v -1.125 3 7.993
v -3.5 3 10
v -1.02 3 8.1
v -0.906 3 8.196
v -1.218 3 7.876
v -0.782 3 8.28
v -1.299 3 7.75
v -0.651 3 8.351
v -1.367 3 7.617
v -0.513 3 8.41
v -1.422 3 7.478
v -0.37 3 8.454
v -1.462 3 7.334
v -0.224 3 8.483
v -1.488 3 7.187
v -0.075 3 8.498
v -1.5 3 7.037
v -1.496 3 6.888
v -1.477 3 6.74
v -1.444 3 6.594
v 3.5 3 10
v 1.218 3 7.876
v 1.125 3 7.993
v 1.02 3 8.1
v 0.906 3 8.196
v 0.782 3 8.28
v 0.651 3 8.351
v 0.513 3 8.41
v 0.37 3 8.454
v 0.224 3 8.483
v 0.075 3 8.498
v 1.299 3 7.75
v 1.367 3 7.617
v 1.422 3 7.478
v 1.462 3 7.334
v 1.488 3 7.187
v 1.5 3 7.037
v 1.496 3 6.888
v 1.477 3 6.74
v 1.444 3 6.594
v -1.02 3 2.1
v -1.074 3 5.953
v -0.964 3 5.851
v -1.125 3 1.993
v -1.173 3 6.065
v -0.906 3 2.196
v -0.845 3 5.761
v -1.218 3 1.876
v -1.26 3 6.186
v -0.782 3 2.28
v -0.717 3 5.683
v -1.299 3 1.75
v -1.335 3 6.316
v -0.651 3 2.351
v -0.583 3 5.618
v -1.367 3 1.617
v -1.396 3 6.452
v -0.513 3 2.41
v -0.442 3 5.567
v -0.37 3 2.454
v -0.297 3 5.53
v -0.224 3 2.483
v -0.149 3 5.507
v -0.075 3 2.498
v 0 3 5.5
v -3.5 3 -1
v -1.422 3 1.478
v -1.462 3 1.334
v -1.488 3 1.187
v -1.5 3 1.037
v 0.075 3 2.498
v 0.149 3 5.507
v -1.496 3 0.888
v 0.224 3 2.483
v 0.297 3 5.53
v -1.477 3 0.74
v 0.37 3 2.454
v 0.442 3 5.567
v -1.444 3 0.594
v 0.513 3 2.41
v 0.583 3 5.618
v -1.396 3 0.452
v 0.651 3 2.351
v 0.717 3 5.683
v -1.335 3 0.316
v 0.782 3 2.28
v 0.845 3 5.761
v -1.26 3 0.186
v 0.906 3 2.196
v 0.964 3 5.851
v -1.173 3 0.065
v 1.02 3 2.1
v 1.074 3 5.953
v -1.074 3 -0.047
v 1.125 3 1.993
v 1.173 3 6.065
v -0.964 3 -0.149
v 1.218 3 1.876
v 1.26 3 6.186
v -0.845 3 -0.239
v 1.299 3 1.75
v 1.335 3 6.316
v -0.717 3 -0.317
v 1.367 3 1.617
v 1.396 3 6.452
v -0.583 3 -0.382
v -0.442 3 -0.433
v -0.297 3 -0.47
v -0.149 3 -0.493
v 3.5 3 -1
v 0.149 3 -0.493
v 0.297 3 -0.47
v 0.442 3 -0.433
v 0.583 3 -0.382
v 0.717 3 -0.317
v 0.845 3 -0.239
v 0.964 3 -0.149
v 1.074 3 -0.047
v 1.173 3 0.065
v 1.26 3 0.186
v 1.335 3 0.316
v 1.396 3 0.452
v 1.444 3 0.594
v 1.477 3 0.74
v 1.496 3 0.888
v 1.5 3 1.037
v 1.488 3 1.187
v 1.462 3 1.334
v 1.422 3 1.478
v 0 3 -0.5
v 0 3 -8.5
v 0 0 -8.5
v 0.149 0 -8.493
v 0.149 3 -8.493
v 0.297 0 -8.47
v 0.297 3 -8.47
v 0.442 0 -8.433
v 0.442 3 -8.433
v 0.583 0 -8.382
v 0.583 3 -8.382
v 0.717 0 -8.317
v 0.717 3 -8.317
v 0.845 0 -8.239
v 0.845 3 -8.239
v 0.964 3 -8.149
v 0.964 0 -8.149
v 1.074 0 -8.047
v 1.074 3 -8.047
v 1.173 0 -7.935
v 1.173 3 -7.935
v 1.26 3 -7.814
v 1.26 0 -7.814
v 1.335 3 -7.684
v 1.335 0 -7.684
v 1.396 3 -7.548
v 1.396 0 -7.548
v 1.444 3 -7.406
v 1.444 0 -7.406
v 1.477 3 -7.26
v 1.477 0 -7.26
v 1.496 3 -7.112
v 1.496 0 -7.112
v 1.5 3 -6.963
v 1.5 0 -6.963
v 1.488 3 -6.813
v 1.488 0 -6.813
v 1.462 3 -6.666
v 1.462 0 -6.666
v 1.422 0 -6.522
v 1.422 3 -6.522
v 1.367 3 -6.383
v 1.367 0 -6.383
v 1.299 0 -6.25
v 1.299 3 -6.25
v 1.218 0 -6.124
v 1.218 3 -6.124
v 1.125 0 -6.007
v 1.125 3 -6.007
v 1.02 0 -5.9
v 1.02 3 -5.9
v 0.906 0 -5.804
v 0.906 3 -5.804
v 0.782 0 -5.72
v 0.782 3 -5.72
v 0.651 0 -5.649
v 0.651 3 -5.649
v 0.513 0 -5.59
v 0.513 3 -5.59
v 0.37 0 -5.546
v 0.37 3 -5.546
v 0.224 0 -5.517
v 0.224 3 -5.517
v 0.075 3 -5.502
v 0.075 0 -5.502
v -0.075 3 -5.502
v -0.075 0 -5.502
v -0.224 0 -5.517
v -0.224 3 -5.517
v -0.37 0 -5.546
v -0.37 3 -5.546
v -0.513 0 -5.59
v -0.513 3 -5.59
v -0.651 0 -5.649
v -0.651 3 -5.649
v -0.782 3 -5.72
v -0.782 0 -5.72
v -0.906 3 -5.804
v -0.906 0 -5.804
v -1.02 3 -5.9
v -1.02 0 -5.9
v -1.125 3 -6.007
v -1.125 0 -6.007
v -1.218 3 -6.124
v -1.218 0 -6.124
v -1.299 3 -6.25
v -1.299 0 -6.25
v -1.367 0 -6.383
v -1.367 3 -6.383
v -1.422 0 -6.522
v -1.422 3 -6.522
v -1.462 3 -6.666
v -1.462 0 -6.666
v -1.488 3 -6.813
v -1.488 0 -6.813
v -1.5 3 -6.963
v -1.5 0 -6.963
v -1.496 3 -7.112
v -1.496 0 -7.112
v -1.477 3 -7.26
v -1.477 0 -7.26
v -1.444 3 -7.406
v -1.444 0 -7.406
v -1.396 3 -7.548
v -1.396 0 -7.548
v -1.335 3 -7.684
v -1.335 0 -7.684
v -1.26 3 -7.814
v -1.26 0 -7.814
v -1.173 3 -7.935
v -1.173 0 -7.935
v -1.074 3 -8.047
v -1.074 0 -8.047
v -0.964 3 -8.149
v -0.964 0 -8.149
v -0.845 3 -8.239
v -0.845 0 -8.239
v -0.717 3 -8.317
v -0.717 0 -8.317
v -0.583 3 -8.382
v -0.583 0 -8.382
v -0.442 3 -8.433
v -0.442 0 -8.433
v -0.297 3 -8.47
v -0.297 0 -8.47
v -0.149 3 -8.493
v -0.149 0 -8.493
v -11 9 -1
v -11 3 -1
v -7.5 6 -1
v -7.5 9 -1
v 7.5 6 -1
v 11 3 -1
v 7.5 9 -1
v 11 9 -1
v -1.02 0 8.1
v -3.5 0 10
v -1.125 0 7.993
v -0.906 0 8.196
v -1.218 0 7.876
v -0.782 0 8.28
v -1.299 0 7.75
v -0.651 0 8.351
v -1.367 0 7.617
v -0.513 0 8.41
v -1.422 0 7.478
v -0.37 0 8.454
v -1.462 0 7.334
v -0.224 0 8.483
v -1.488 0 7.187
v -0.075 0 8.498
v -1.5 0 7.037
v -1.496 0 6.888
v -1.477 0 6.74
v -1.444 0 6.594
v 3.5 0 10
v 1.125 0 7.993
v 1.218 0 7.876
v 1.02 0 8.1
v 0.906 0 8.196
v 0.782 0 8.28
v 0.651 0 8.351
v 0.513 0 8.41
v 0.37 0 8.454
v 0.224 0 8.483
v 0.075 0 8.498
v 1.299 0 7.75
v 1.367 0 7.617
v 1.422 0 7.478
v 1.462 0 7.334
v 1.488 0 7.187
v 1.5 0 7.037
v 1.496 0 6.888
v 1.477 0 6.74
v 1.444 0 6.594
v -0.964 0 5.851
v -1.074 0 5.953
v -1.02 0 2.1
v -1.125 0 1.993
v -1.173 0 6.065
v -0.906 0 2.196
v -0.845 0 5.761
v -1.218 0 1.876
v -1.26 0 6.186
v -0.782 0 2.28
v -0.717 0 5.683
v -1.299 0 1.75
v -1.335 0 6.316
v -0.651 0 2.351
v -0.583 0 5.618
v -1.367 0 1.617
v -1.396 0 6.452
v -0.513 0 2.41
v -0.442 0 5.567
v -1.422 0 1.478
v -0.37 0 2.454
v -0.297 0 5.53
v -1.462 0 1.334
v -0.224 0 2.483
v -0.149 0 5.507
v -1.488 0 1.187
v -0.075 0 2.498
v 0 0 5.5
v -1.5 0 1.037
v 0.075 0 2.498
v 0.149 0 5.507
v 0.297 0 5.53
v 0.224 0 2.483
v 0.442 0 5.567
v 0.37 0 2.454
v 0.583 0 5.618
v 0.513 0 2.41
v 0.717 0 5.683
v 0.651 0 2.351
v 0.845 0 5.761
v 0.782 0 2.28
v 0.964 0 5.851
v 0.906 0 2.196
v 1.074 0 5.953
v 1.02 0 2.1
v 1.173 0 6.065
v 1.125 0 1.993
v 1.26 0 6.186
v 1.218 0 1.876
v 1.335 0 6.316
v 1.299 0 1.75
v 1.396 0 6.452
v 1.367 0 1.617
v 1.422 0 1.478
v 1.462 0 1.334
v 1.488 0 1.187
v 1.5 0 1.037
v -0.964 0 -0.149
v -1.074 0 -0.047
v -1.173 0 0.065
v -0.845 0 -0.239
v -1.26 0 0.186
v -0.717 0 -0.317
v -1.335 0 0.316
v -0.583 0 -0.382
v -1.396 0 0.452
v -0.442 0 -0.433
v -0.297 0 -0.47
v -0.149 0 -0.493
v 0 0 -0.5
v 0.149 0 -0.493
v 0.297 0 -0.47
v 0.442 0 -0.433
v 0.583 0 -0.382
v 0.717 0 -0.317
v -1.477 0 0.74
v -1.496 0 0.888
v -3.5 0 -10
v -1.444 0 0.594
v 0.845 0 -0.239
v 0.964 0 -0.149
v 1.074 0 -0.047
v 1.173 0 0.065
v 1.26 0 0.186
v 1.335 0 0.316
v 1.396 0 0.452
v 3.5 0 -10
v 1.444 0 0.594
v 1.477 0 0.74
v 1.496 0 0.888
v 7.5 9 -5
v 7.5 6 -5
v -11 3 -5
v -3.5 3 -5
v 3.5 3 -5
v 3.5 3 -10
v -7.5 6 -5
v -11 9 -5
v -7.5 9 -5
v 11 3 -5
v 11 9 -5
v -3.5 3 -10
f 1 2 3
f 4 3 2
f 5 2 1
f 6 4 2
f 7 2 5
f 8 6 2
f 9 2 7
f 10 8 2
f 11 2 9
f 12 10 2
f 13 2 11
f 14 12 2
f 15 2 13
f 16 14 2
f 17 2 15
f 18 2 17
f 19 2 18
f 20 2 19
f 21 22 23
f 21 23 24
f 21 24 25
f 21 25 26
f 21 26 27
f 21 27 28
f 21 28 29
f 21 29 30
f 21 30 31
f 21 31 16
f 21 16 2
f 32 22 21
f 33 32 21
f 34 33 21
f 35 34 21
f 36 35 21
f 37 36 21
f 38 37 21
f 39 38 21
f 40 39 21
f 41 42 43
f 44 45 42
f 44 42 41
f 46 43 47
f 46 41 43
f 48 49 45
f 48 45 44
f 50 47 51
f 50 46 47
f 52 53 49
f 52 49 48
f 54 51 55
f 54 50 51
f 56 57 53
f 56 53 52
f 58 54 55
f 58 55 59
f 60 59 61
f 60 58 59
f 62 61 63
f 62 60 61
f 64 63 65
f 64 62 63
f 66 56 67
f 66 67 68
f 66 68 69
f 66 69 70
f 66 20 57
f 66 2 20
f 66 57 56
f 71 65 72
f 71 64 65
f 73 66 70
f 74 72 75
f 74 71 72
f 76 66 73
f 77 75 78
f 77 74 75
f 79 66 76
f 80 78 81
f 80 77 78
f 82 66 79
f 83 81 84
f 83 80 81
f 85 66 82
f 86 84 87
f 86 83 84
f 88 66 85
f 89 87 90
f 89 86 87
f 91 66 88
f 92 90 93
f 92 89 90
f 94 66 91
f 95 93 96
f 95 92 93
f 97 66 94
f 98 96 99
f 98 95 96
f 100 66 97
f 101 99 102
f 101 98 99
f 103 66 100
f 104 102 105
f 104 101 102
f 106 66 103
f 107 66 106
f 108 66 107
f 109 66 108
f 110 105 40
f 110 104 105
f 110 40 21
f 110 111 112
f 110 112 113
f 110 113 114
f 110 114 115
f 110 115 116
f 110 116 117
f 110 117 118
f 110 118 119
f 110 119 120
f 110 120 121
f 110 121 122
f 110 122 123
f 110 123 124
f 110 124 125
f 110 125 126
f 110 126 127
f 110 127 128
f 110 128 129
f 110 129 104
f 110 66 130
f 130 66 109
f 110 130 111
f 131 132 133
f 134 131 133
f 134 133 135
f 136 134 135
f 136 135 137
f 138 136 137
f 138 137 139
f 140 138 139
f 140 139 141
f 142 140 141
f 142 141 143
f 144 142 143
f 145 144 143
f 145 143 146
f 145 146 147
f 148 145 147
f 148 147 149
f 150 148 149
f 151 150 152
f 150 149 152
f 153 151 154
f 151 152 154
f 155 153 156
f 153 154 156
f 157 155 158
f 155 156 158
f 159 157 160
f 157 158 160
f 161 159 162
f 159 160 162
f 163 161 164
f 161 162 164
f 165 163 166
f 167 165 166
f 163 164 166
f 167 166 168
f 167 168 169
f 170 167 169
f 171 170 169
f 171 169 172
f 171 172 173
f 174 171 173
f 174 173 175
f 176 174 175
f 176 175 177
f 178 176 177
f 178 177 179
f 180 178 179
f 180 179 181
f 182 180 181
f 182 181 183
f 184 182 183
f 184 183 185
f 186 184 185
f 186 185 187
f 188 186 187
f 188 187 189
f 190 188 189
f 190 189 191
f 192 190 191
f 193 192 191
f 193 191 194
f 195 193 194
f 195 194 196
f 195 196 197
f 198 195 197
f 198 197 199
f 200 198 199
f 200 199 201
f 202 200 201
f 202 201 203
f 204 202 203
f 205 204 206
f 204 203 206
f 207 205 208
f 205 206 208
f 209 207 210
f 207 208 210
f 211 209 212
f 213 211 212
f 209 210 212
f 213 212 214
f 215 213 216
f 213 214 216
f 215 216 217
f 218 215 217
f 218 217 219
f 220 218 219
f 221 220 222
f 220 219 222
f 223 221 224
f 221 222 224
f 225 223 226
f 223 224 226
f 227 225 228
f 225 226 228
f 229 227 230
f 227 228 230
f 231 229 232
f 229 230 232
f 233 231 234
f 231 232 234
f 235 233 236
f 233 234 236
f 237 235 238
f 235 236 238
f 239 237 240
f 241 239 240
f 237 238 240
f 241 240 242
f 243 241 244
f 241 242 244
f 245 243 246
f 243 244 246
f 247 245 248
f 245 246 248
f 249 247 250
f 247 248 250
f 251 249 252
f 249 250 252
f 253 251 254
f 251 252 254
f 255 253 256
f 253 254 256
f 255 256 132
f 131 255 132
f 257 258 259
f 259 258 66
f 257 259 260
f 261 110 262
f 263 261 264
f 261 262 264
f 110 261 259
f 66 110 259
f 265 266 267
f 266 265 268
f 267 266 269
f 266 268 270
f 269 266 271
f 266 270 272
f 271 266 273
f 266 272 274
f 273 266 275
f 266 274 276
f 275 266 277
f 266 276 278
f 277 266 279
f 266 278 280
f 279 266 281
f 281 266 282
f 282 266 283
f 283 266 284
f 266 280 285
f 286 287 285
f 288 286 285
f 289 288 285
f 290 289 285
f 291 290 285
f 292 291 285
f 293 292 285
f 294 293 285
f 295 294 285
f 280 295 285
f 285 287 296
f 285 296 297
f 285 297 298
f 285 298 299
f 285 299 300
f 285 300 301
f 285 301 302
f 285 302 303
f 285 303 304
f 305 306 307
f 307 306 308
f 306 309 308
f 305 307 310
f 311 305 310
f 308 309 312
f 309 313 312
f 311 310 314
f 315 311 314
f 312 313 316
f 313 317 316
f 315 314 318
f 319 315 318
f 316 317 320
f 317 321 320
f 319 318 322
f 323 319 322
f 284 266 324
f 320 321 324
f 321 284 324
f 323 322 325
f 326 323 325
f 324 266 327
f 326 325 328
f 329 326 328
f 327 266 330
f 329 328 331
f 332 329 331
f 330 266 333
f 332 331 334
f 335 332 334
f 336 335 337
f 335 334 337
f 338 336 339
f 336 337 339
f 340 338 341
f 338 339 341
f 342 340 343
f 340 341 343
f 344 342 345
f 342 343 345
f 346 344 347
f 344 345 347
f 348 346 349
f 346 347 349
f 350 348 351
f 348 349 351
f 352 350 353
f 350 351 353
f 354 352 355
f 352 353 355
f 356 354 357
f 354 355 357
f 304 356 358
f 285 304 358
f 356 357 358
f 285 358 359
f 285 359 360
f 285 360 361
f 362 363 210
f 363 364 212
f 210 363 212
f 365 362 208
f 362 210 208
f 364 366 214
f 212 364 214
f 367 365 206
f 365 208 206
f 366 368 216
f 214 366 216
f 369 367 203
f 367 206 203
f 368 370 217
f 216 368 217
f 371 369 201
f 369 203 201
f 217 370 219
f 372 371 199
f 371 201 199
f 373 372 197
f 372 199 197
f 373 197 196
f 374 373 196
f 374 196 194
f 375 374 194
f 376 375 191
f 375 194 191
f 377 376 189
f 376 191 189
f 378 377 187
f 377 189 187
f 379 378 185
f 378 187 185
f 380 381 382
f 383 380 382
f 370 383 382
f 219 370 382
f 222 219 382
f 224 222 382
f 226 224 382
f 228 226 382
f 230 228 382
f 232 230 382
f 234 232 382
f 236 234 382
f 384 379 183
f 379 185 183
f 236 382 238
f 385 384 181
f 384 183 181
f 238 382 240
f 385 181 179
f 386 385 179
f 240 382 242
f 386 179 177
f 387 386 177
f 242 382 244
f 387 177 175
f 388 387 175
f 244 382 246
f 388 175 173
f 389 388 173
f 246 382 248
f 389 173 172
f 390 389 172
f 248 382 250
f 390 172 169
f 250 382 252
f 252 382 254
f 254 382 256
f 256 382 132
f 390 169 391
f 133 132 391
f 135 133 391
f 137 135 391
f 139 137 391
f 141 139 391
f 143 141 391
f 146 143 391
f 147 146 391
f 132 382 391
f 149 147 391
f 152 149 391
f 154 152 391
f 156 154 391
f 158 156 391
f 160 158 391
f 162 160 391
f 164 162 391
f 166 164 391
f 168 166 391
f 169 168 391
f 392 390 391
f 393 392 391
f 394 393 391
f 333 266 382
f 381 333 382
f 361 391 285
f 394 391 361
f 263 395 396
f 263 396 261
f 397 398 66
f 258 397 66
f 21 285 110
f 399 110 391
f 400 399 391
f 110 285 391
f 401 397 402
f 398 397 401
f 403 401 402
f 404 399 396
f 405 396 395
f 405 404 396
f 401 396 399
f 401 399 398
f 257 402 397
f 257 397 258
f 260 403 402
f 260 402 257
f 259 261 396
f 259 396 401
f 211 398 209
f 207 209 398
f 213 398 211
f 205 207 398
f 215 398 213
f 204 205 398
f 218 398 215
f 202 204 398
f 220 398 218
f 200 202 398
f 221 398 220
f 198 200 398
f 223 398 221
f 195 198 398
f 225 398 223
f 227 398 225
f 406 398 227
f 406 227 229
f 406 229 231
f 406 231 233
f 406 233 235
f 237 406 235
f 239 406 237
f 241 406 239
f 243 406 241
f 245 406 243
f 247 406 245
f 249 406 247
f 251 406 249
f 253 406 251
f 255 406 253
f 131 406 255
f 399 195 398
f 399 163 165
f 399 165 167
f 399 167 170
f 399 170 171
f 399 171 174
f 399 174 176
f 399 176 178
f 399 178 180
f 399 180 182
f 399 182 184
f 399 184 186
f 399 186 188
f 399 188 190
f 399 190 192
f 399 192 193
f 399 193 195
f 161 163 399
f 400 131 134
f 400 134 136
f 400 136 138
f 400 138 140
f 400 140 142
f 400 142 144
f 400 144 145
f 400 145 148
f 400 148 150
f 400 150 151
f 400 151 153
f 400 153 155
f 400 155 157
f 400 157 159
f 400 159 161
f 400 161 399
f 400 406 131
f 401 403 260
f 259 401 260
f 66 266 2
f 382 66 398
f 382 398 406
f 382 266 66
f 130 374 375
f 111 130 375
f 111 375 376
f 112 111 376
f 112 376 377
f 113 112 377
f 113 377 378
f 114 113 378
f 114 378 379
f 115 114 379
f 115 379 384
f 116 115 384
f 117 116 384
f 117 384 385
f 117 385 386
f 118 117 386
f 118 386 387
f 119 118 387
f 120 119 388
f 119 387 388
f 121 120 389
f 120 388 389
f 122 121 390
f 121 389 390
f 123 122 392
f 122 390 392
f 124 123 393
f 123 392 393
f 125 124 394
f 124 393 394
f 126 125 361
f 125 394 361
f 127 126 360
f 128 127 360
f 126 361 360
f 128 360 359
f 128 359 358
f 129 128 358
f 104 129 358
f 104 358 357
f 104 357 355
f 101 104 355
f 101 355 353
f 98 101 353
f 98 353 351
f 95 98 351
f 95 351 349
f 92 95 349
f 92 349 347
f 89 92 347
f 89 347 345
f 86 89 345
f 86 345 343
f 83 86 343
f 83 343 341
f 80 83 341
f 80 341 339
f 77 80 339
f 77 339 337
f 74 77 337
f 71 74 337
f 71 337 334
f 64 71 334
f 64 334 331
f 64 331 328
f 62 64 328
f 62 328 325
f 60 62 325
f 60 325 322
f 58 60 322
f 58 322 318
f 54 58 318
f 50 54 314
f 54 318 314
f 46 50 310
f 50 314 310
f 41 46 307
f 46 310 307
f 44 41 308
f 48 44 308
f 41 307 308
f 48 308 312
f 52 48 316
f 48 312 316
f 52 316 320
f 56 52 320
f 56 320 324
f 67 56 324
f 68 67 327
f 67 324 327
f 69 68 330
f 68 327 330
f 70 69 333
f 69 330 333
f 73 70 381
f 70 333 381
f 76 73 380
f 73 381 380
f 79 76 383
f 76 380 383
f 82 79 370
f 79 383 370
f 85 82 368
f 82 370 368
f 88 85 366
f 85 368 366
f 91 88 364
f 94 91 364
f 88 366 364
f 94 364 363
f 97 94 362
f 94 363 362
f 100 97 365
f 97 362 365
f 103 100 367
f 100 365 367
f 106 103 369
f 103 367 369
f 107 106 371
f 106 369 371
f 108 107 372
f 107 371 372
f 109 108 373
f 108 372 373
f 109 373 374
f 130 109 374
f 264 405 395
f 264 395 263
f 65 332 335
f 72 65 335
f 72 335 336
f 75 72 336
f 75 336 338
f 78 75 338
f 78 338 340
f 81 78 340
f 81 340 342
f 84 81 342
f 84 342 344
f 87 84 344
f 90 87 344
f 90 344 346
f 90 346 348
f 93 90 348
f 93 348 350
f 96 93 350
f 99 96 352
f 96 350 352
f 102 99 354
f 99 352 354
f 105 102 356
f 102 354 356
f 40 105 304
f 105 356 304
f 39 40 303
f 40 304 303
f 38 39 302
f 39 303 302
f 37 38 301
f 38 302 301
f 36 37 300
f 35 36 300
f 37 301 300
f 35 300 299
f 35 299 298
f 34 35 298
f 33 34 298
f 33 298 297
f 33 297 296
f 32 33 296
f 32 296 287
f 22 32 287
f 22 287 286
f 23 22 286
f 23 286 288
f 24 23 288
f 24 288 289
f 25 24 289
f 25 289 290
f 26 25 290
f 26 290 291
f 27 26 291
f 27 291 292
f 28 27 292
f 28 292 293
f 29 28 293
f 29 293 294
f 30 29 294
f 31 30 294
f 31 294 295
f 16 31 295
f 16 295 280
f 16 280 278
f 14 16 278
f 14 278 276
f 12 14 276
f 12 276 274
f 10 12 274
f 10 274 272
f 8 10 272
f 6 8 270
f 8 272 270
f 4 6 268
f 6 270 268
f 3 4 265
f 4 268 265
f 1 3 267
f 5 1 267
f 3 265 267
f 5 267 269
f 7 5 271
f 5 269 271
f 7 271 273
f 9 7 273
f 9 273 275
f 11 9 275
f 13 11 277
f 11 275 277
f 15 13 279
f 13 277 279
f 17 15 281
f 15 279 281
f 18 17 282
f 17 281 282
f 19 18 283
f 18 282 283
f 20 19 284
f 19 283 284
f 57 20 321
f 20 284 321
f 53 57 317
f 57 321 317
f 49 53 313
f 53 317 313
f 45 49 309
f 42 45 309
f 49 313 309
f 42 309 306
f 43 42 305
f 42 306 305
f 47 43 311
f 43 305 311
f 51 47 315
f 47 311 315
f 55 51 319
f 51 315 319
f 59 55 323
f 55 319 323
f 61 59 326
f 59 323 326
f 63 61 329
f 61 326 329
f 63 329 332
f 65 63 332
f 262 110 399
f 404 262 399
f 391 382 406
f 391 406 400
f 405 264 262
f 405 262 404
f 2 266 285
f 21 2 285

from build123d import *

# Parameters (mm, degrees)
SKETCH2_W                    = 7
SKETCH2_H                    = 20
EXTRUDE2_DEPTH               = 3
F_3_0_3_DIAMETER_HOLE1_D     = 3
F_3_0_3_DIAMETER_HOLE1_DEPTH = 10
F_3_0_3_DIAMETER_HOLE1_TIP   = 0.901290929
SKETCH6_W                    = 7
SKETCH6_H                    = 4
EXTRUDE3_DEPTH               = 6
SKETCH7_W                    = 4
SKETCH7_H                    = 6
EXTRUDE4_DEPTH               = 7.5
SKETCH8_W                    = 4
SKETCH8_H                    = 6
EXTRUDE5_DEPTH               = 7.5
SKETCH10_W                   = 15
SKETCH10_H                   = 4
EXTRUDE6_DEPTH               = 3


with BuildPart() as part:
    # Sketch2 → Extrude2 (new body)
    with BuildSketch(Plane(origin=(0, 0, 0), x_dir=(1, 0, 0), z_dir=(0, 1, 0))):
        Rectangle(SKETCH2_W, SKETCH2_H)
    extrude(amount=EXTRUDE2_DEPTH)

    # Ø3.0 (3) Diameter Hole1
    with Locations(Plane(origin=(0, 3, 7), x_dir=(0, 0, 1), z_dir=(0, 1, 0))):
        with Locations((0, 0), (-6, 0), (-14, 0)):
            Hole(F_3_0_3_DIAMETER_HOLE1_D / 2, depth=F_3_0_3_DIAMETER_HOLE1_DEPTH)
            with Locations((0, 0, -(F_3_0_3_DIAMETER_HOLE1_DEPTH + F_3_0_3_DIAMETER_HOLE1_TIP / 2))):  # 118° drill point
                Cone(0, F_3_0_3_DIAMETER_HOLE1_D / 2, F_3_0_3_DIAMETER_HOLE1_TIP, mode=Mode.SUBTRACT)

    # Sketch6 → Extrude3 (add)
    with BuildSketch(Plane(origin=(0, 3, 0), x_dir=(1, 0, 0), z_dir=(0, 1, 0))):
        with Locations((0, 3)):
            Rectangle(SKETCH6_W, SKETCH6_H)
    extrude(amount=EXTRUDE3_DEPTH)

    # Sketch7 → Extrude4 (add)
    with BuildSketch(Plane(origin=(3.5, 0, 0), x_dir=(0, 0, -1), z_dir=(1, 0, 0))):
        with Locations((3, 6)):
            Rectangle(SKETCH7_W, SKETCH7_H)
    extrude(amount=EXTRUDE4_DEPTH)

    # Sketch8 → Extrude5 (add)
    with BuildSketch(Plane.ZY.offset(3.5)):
        with Locations((-3, 6)):
            Rectangle(SKETCH8_W, SKETCH8_H)
    extrude(amount=EXTRUDE5_DEPTH)

    # Sketch10 → Extrude6 (cut)
    with BuildSketch(Plane(origin=(0, 9, 0), x_dir=(-1, 0, 0), z_dir=(0, 1, 0))):
        with Locations((0, -3)):
            Rectangle(SKETCH10_W, SKETCH10_H)
    extrude(amount=-EXTRUDE6_DEPTH, mode=Mode.SUBTRACT)


solid = part.part
